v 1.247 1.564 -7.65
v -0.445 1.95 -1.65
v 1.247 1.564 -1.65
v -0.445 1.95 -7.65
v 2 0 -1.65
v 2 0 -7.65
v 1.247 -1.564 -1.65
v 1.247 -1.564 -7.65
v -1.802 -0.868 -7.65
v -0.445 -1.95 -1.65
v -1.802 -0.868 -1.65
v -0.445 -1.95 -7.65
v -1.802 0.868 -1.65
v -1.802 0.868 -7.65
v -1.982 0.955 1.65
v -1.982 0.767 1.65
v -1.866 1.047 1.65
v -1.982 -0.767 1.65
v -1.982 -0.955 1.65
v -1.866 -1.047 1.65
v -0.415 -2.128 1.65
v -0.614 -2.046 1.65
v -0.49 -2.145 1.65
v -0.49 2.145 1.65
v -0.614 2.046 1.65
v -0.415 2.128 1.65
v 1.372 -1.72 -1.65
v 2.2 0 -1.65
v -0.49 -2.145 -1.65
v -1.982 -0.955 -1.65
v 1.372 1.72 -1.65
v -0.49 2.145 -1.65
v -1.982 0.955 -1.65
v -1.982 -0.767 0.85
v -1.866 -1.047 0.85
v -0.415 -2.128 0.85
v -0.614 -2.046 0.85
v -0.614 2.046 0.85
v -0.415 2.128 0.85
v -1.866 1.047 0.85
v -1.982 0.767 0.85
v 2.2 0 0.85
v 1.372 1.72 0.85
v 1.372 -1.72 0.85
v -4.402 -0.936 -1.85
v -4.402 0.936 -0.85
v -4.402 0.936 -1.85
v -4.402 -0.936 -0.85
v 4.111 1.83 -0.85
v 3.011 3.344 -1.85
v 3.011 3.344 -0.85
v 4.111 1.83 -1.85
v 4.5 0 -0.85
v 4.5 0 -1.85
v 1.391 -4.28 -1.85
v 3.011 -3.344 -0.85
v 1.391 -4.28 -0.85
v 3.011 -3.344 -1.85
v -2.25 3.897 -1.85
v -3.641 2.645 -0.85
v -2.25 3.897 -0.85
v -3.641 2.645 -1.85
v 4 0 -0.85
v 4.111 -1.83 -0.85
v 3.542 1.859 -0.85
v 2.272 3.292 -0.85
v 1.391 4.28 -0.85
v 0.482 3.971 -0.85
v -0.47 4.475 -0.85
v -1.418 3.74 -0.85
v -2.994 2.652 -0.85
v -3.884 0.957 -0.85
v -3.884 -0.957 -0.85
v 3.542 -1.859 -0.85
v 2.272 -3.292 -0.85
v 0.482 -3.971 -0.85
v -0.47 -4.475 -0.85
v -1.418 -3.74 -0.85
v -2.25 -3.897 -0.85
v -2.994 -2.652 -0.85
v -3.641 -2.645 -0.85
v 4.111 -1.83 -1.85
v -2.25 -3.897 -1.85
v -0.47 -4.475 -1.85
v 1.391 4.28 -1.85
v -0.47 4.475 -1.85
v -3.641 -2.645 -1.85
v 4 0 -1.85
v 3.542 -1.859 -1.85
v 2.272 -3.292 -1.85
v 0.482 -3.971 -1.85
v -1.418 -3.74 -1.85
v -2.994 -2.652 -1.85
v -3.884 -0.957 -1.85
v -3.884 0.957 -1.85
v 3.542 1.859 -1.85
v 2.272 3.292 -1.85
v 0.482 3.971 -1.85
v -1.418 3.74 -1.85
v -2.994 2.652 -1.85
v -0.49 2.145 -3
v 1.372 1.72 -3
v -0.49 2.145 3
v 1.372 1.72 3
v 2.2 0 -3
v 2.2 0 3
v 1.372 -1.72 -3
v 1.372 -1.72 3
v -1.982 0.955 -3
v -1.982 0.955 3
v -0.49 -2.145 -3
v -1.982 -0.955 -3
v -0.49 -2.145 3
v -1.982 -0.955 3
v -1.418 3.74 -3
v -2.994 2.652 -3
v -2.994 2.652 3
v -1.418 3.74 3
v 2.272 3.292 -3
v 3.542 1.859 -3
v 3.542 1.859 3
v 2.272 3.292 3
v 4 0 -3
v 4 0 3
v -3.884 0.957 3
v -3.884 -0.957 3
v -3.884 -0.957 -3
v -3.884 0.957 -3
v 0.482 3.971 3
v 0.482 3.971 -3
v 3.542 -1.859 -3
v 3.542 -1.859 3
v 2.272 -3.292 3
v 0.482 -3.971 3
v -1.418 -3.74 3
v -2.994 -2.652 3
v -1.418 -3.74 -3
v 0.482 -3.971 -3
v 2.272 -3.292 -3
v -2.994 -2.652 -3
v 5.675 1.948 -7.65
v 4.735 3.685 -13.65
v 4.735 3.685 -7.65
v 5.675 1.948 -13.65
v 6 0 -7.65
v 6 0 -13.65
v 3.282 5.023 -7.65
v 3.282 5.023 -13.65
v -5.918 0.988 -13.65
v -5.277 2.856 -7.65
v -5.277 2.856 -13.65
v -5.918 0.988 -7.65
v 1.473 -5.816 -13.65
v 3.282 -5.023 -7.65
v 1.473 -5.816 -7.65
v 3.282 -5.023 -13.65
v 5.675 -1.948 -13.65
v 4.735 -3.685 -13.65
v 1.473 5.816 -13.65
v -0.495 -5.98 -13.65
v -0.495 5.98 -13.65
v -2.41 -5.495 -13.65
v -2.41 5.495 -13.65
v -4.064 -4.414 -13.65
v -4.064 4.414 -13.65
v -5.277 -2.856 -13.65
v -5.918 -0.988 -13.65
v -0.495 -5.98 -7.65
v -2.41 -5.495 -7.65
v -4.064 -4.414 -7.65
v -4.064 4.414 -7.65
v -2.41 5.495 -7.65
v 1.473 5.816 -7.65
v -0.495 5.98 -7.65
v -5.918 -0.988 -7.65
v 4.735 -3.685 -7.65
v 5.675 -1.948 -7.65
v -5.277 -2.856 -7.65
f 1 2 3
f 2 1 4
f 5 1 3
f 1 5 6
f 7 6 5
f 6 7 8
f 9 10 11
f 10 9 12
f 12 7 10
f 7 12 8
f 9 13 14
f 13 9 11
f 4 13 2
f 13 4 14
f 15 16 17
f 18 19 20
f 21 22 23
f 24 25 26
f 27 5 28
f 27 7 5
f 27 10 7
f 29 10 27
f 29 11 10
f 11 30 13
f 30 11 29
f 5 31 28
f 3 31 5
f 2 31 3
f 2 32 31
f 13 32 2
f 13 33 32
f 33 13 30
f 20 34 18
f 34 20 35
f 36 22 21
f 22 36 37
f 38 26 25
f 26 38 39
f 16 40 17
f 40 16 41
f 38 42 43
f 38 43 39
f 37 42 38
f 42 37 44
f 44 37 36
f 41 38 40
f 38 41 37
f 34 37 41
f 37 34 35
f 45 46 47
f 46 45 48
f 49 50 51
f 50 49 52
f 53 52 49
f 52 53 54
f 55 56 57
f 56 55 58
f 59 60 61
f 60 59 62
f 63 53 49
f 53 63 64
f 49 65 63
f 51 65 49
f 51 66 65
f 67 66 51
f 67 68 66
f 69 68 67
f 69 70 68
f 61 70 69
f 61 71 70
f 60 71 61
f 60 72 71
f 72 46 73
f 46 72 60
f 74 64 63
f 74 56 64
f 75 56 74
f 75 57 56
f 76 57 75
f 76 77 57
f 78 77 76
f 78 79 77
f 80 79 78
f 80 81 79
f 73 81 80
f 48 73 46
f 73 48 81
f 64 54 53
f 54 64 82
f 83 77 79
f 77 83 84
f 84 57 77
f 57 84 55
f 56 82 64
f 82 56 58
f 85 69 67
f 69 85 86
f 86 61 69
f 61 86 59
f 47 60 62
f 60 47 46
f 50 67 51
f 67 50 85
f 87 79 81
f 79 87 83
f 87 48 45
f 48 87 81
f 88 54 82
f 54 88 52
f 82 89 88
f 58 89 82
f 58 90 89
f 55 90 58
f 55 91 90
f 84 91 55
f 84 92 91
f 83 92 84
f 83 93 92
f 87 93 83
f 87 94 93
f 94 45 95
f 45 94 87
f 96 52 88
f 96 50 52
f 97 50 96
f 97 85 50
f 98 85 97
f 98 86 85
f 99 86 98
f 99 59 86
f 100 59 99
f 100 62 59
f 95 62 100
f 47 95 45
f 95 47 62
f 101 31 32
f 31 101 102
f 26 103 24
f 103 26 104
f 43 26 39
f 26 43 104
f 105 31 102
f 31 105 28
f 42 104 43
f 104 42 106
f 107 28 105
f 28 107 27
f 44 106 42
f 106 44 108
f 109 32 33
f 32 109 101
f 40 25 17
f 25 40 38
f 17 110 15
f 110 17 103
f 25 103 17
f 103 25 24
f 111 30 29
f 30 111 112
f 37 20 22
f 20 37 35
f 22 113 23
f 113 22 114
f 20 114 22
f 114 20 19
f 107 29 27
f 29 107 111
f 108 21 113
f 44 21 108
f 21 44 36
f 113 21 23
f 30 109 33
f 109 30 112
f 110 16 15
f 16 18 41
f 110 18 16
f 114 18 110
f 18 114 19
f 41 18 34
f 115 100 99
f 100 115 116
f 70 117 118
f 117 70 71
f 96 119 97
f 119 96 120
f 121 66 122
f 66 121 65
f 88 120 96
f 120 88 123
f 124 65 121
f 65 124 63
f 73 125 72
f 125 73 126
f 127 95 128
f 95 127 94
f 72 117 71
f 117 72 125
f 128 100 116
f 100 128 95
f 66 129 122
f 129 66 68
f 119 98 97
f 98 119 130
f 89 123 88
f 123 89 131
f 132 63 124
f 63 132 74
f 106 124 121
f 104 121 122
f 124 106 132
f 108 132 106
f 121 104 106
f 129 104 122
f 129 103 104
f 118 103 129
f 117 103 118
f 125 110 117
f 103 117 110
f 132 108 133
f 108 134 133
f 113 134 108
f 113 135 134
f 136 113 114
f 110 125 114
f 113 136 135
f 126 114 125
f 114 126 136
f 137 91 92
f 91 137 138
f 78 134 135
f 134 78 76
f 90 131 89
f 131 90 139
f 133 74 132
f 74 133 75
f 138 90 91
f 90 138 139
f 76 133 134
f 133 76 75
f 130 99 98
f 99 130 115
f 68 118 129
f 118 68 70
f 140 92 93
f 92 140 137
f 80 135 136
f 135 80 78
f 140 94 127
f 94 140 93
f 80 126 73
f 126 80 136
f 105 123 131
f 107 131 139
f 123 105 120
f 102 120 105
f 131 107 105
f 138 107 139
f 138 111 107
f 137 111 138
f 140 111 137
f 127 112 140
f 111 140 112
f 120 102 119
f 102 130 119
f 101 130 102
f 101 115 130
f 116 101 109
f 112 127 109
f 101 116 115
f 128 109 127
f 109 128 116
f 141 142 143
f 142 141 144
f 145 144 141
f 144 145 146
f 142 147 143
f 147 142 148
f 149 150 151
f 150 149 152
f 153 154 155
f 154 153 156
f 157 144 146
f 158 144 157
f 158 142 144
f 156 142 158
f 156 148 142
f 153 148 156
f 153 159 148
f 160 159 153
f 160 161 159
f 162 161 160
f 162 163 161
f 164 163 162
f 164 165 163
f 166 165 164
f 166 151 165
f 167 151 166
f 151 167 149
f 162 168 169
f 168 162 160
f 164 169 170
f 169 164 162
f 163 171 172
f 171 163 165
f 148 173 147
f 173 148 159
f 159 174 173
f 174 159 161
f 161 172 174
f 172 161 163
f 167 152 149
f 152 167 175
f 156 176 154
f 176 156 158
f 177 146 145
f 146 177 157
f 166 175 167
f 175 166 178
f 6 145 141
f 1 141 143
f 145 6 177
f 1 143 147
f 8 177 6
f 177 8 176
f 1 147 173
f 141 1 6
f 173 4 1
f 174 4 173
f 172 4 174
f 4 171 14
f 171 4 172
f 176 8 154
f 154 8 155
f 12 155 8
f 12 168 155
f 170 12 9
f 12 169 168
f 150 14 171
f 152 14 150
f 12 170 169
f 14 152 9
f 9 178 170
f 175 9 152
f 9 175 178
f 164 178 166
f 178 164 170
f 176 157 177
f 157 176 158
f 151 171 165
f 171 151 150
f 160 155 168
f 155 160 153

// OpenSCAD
// Parameters
shaft_diameter_mm = 4.0; //[2.0:8.0:0.1]
shaft_length_mm = 10.0; //[5.0:20.0:0.5]
head_diameter_mm = 7.8; //[4.0:15.6:0.1]
head_height_mm = 3.3; //[1.6:6.6:0.1]
under_head_fillet_height_mm = 0.8; //[0.4:1.6:0.1]
under_head_overlap_mm = 0.8; //[0.5:2.0:0.1]
drive_recess_diameter_mm = 4.6; //[2.0:7.0:0.1]
drive_recess_depth_mm = 1.6; //[0.8:3.0:0.1]
pcb_spacer_outer_diameter_mm = 8.0; //[4.0:16.0:0.1]
pcb_spacer_height_mm = 6.0; //[3.0:12.0:0.5]
washer_outer_diameter_mm = 9.0; //[5.0:18.0:0.1]
washer_thickness_mm = 1.0; //[0.5:2.0:0.1]
buzzer_diameter_mm = 12.0; //[6.0:24.0:0.1]
buzzer_height_mm = 6.0; //[3.0:12.0:0.5]

// PCB Spacer - complete geometry
module pcb_spacer() {
  color([0.85, 0.85, 0.8]) {
    difference() {
      cylinder(r=pcb_spacer_outer_diameter_mm/2, h=pcb_spacer_height_mm, center=true);
      translate([0, 0, 0])
        cylinder(r=shaft_diameter_mm/2 + 0.2, h=pcb_spacer_height_mm + 2*under_head_overlap_mm, center=true);
    }
  }
}

// Screw and Washer - complete geometry
module screw_and_washer() {
  color("DimGray") {
    // Screw
    difference() {
      union() {
        translate([0, 0, -head_height_mm/2 - shaft_length_mm/2 + under_head_overlap_mm])
          cylinder(r=shaft_diameter_mm/2, h=shaft_length_mm, center=true);
        translate([0, 0, 0])
          cylinder(r=head_diameter_mm/2, h=head_height_mm, center=true);
        translate([0, 0, -head_height_mm/2 - under_head_fillet_height_mm/2 + under_head_overlap_mm])
          cylinder(r1=head_diameter_mm/2, r2=shaft_diameter_mm/2, h=under_head_fillet_height_mm, center=true);
      }
      translate([0, 0, head_height_mm/2 - drive_recess_depth_mm/2 + under_head_overlap_mm])
        cylinder(r=drive_recess_diameter_mm/2, h=drive_recess_depth_mm, center=true);
    }
    // Washer
    translate([0, 0, -head_height_mm/2 - washer_thickness_mm/2 + under_head_overlap_mm])
      difference() {
        cylinder(r=washer_outer_diameter_mm/2, h=washer_thickness_mm, center=true);
        cylinder(r=shaft_diameter_mm/2 + 0.2, h=washer_thickness_mm + 2*under_head_overlap_mm, center=true);
      }
  }
}

// Buzzer - complete geometry
module buzzer() {
  color([0.1, 0.1, 0.6]) {
    translate([0, 0, -head_height_mm/2 - under_head_fillet_height_mm - pcb_spacer_height_mm - buzzer_height_mm/2 + under_head_overlap_mm])
      cylinder(r=buzzer_diameter_mm/2, h=buzzer_height_mm, center=true);
  }
}

// Assembly
module assembly() {
  screw_and_washer();
  pcb_spacer();
  buzzer();
}

assembly();
